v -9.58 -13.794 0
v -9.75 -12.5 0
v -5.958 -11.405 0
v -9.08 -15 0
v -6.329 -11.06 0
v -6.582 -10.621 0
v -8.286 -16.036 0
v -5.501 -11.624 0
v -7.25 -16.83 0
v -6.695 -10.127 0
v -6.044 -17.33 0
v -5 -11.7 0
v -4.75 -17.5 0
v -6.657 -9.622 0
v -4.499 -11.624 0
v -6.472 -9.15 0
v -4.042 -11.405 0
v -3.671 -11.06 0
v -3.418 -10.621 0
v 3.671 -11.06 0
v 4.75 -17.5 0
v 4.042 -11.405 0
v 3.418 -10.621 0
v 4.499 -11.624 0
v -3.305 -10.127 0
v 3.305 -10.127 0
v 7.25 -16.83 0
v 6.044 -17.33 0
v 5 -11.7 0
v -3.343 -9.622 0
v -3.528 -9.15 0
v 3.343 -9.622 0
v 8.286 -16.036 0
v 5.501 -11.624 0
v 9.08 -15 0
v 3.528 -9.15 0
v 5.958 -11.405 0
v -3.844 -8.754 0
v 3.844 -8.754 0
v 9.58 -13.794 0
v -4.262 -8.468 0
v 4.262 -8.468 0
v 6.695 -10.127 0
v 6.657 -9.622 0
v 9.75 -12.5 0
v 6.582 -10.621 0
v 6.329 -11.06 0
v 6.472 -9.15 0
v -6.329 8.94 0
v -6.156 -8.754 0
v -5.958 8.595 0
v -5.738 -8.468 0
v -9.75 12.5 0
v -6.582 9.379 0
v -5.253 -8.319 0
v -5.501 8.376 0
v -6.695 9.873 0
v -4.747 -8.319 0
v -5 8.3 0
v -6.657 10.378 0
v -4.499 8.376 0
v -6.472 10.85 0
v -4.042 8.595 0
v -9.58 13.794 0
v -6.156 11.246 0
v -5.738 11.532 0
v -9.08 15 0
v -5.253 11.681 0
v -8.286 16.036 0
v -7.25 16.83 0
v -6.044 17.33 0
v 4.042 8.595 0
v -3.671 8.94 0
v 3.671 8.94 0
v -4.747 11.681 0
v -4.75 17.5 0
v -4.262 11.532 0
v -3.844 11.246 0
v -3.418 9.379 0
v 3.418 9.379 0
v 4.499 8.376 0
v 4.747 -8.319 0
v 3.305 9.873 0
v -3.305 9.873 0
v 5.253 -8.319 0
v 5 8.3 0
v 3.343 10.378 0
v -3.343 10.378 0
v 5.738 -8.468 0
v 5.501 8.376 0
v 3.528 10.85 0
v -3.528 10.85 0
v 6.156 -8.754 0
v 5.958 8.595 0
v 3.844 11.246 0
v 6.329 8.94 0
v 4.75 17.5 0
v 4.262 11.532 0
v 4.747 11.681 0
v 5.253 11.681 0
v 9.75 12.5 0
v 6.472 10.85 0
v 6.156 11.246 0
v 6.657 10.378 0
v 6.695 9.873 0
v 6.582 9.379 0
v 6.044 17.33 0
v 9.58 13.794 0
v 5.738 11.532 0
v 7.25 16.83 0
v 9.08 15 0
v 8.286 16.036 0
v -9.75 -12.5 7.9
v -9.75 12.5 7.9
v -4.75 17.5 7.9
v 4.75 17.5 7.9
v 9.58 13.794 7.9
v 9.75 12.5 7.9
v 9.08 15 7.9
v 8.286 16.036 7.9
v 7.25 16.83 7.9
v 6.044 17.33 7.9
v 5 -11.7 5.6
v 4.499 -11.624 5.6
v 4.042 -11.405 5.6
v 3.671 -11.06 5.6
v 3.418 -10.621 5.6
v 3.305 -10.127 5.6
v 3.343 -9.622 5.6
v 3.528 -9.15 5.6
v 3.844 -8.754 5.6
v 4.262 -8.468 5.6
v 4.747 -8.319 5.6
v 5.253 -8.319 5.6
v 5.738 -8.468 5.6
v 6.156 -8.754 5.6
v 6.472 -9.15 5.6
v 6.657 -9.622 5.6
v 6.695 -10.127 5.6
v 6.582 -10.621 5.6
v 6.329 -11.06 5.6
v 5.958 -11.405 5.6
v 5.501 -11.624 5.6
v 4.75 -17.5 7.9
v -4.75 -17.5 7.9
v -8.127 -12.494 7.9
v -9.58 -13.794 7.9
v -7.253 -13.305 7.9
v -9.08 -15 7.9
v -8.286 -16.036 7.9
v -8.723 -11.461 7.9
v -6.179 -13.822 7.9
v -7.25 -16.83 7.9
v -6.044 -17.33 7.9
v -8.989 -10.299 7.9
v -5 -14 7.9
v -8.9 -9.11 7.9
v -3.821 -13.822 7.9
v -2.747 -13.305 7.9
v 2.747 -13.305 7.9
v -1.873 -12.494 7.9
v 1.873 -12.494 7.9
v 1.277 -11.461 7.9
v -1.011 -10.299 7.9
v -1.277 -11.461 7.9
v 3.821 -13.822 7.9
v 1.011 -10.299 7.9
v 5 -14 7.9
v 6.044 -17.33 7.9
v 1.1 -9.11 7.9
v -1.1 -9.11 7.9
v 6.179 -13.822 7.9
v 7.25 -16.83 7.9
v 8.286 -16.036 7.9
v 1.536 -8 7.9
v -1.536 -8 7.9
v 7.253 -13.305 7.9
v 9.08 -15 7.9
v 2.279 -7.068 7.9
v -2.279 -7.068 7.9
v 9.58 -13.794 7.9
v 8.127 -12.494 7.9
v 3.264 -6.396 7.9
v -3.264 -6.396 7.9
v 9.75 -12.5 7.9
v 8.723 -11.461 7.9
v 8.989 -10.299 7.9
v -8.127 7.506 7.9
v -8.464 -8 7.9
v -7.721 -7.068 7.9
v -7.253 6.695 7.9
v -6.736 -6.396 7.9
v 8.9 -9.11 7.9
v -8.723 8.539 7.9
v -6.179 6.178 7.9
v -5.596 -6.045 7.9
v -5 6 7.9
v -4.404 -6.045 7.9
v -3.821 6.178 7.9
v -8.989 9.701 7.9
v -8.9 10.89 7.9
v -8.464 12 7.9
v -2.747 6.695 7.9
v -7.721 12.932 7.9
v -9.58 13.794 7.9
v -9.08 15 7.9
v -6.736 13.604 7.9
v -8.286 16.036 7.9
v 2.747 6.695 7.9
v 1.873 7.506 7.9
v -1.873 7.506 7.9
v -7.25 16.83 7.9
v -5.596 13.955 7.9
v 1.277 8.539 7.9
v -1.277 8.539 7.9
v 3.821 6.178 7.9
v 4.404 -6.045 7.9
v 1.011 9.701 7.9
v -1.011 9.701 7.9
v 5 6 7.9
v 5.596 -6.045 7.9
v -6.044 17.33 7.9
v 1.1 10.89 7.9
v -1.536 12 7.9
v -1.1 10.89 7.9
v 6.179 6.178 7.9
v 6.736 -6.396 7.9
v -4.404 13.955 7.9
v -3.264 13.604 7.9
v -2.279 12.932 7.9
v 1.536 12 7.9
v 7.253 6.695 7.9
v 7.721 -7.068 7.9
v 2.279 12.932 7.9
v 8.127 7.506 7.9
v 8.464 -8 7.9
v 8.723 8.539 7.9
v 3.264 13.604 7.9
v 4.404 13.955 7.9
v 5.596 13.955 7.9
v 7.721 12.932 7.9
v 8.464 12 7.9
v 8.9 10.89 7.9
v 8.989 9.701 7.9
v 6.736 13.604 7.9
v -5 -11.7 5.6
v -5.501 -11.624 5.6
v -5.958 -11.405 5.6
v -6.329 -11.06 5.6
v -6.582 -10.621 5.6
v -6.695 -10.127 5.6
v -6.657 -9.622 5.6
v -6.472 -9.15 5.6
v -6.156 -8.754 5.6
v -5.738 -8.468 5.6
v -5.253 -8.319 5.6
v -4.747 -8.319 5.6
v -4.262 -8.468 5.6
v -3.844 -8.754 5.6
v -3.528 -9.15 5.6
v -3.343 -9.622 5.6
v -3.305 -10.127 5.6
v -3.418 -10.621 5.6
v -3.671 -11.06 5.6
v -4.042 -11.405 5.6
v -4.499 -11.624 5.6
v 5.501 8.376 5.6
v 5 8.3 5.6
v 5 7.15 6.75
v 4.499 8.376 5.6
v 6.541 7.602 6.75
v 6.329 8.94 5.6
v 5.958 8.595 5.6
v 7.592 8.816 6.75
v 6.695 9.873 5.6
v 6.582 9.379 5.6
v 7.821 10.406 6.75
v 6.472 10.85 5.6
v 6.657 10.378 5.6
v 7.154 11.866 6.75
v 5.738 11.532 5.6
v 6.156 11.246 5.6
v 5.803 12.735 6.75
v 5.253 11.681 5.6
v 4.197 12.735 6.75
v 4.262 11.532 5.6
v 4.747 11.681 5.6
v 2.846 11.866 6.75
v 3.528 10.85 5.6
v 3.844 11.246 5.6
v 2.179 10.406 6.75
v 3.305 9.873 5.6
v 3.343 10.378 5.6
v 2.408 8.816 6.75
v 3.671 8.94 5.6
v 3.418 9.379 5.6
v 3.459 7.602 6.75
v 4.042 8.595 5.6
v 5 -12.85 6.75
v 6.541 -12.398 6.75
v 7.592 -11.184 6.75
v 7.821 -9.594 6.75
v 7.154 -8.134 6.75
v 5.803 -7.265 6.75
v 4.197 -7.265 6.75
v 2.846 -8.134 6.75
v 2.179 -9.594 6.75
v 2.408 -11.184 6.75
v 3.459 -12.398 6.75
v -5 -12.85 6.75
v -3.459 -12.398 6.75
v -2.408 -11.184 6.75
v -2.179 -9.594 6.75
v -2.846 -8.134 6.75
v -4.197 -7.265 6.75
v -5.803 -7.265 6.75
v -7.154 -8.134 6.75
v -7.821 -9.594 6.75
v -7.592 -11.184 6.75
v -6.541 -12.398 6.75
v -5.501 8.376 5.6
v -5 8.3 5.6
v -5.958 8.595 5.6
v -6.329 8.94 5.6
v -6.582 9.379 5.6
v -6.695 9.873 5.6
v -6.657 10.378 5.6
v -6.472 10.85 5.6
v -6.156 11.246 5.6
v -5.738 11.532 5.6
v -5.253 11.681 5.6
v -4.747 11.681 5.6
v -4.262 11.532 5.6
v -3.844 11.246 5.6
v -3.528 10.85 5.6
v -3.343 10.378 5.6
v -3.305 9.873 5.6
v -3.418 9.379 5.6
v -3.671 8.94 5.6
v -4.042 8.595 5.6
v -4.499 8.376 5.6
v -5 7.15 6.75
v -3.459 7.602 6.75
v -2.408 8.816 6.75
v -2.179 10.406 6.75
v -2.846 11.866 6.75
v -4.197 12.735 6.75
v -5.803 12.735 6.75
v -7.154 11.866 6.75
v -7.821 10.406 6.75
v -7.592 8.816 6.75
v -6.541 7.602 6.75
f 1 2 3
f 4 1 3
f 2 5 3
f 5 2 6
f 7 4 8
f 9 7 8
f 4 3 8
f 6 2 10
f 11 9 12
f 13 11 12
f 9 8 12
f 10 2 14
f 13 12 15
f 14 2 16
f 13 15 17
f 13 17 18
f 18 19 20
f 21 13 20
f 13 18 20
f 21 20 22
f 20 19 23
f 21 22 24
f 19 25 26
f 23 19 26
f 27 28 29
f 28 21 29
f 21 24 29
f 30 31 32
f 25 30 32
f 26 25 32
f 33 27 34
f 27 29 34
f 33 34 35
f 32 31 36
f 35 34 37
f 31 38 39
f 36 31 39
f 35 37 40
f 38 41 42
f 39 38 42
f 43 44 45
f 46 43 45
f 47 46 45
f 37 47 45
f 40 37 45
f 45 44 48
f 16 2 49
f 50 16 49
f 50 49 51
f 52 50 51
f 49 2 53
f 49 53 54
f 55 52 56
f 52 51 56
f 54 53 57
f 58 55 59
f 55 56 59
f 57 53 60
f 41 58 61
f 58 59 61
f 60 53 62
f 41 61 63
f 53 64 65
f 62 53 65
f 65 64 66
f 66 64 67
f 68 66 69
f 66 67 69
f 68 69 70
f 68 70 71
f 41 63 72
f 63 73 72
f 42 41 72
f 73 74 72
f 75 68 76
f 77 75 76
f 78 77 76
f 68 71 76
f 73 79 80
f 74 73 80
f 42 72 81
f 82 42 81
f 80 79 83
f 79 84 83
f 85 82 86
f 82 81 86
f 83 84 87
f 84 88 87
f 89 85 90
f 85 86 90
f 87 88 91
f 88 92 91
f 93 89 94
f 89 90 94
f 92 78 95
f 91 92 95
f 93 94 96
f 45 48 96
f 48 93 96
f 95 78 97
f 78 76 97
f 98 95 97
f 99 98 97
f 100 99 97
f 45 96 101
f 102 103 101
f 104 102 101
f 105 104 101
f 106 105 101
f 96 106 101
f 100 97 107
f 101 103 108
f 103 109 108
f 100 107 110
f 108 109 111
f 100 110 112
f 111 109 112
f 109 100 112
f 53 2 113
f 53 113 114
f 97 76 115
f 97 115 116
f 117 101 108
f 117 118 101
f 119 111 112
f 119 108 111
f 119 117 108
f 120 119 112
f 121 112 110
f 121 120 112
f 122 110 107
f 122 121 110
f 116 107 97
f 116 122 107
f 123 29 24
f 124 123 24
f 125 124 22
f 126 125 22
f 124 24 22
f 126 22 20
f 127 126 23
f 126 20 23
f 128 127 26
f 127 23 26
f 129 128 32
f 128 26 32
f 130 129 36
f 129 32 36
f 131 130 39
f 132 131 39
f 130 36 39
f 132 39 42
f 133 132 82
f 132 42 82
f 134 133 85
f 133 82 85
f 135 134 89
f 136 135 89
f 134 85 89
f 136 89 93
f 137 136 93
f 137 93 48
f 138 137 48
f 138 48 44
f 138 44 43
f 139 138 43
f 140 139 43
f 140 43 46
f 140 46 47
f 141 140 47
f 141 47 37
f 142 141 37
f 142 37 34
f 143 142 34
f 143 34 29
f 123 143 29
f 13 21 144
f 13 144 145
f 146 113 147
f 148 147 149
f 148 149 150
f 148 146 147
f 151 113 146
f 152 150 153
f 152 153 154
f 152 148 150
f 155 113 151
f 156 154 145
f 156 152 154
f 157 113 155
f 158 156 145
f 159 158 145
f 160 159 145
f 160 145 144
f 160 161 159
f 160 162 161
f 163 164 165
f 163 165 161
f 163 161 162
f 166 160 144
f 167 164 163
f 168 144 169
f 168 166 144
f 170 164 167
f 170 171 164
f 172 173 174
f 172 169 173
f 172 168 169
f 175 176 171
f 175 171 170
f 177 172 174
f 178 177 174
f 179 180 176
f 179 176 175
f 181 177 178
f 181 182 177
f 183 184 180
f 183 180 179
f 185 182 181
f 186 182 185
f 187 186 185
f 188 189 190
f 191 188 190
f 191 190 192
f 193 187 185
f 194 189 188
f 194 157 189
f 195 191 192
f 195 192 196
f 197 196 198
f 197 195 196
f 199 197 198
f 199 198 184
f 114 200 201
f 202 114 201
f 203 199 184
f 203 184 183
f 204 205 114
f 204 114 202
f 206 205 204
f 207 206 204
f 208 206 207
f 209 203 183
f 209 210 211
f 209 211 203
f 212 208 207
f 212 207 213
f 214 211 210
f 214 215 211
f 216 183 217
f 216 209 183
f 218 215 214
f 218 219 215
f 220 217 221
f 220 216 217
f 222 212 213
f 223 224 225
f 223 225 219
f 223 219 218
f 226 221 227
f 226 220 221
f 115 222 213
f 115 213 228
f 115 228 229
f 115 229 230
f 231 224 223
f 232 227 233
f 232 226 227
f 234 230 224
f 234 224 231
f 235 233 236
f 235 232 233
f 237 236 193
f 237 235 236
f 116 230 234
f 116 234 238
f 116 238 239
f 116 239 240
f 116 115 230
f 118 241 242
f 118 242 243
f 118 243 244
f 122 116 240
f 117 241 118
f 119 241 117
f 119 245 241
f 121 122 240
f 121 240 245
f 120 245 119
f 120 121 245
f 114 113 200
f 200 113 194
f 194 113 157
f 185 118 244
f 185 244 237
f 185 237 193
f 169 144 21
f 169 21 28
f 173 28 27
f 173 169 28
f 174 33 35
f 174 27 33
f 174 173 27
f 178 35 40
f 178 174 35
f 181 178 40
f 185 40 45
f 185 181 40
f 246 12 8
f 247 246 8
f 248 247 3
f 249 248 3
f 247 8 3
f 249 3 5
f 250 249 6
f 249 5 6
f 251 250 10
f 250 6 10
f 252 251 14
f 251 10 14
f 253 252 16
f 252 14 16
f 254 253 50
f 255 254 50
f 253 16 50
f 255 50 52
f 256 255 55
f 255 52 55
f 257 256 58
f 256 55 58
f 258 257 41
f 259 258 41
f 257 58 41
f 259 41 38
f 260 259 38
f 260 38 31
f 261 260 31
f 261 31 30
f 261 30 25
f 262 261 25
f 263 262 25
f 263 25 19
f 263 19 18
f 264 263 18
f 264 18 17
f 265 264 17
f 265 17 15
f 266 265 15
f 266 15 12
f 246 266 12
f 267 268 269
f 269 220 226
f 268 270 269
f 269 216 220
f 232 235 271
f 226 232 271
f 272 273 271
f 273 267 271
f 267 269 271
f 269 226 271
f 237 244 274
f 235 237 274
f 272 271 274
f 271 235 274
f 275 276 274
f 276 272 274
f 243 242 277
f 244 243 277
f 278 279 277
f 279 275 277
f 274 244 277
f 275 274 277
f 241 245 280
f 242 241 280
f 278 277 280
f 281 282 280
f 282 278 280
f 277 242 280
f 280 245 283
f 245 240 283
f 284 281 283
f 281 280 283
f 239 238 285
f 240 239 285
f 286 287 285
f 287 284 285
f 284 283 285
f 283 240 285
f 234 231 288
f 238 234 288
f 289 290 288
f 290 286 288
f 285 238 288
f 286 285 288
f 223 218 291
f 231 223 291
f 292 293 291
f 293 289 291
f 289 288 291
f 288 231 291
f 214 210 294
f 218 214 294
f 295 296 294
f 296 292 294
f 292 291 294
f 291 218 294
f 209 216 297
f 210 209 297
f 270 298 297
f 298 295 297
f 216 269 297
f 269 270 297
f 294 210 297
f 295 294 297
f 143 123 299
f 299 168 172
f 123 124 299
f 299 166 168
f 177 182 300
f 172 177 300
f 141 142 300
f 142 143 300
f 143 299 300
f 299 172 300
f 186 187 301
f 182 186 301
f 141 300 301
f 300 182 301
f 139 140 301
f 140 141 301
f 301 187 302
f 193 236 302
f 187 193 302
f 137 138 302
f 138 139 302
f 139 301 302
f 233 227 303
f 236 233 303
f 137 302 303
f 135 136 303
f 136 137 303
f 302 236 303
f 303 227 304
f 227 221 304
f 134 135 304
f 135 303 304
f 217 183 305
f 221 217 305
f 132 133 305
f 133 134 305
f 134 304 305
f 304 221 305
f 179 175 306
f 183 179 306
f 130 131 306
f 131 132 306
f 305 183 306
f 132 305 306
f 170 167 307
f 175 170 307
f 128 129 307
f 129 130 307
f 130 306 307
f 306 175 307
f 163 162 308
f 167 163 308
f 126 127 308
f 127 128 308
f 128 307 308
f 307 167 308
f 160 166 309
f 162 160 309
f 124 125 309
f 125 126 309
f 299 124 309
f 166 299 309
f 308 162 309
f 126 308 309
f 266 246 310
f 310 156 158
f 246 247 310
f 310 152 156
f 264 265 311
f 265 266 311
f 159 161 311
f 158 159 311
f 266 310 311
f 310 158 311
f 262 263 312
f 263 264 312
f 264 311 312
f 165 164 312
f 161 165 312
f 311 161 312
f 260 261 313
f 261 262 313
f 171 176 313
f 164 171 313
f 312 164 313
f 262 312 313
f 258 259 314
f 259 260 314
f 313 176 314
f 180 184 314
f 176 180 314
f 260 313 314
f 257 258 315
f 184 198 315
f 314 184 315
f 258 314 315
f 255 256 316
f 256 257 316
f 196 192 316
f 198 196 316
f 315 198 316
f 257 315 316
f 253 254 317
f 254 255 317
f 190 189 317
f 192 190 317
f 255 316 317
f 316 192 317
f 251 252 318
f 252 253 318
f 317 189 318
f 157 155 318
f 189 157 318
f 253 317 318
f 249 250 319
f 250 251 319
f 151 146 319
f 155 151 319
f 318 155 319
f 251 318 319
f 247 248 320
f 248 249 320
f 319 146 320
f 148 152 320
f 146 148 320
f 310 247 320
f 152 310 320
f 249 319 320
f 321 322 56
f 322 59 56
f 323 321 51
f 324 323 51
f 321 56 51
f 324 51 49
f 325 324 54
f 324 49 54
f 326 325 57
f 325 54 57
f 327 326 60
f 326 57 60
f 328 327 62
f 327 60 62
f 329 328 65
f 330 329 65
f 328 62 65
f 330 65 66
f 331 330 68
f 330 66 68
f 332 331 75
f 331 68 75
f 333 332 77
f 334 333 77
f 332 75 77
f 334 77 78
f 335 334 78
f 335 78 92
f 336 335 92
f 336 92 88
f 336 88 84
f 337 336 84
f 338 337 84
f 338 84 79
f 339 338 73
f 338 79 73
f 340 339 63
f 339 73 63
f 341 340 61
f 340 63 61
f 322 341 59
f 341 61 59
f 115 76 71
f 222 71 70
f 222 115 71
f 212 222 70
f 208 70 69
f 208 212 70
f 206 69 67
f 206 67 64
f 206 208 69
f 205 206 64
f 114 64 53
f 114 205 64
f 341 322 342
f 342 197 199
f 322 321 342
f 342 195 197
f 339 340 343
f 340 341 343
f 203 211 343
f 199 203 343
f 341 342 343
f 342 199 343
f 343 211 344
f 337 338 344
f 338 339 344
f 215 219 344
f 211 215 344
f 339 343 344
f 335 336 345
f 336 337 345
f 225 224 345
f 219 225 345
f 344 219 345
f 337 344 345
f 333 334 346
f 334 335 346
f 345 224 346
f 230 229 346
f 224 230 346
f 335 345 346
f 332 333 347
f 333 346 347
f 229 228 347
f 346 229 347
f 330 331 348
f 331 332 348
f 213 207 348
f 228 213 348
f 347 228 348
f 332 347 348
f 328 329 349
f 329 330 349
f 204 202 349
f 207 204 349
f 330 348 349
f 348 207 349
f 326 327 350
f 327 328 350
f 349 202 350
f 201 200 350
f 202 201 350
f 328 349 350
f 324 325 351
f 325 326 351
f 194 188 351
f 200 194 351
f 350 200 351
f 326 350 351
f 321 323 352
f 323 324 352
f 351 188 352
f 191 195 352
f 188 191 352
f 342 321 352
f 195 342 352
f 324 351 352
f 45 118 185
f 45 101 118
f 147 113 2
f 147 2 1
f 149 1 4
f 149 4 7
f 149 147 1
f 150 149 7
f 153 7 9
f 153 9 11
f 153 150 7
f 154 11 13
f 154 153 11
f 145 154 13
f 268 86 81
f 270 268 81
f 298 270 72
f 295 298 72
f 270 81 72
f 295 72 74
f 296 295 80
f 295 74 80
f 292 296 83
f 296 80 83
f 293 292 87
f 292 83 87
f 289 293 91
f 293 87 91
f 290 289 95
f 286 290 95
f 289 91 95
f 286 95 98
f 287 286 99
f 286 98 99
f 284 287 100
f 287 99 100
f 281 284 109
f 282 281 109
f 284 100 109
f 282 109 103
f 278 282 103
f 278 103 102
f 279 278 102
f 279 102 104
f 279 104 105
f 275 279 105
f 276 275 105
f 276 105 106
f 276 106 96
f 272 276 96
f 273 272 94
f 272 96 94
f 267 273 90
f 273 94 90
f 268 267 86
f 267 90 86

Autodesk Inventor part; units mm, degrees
ref_plane "YZ Plane" through (0, 0, 0) normal (1, 0, 0) x (0, 1, 0)
ref_plane "XZ Plane" through (0, 0, 0) normal (0, 1, 0) x (-1, 0, 0)
ref_plane "XY Plane" through (0, 0, 0) normal (0, 0, 1) x (1, 0, 0)
sketch "Sketch1" plane through (0, 0, 0) normal (0, 0, 1) x (1, 0, 0)
  line L0 (-9.75, 17.5) -> (9.75, 17.5)
  line L1 (9.75, 17.5) -> (9.75, -17.5)
  line L2 (9.75, -17.5) -> (-9.75, -17.5)
  line L3 (-9.75, -17.5) -> (-9.75, 17.5)
  line L4 (-9.75, 17.5) -> (9.75, -17.5) construction
  line L5 (9.75, 17.5) -> (-9.75, -17.5) construction
  point P0 (0, 0)
  dimension "d0" = 19.5
  dimension "d1" = 35
extrude "Extrusion1" add sketch "Sketch1" along normal blind 7.9
sketch "Sketch2" plane through (0, 0, 7.9) normal (0, 0, 1) x (1, 0, 0)
  line L0 (-5, 10) -> (5, 10)
  line L1 (5, 10) -> (5, -10)
  line L2 (5, -10) -> (-5, -10)
  line L3 (-5, -10) -> (-5, 10)
  line L4 (-5, 10) -> (5, -10) construction
  line L5 (5, 10) -> (-5, -10) construction
  point P0 (0, 0)
  dimension "d4" = 10
  dimension "d5" = 20
hole "Hole1" at (-5, 10, 7.9) at (5, 10, 7.9) at (5, -10, 7.9) at (-5, -10, 7.9) direction (0, 0, -1) diameter 3.4 end through all countersink diameter 8 countersink angle 90 clearance for "Countersunk Flat Head Screw ISO 2009/7046" size "M3" standard "ISO"
fillet "Fillet1" radius 5 4 edges at (9.75, -17.5, 3.95) (-9.75, -17.5, 3.95) (-9.75, 17.5, 3.95) (9.75, 17.5, 3.95)
properties part number "RailTab"
